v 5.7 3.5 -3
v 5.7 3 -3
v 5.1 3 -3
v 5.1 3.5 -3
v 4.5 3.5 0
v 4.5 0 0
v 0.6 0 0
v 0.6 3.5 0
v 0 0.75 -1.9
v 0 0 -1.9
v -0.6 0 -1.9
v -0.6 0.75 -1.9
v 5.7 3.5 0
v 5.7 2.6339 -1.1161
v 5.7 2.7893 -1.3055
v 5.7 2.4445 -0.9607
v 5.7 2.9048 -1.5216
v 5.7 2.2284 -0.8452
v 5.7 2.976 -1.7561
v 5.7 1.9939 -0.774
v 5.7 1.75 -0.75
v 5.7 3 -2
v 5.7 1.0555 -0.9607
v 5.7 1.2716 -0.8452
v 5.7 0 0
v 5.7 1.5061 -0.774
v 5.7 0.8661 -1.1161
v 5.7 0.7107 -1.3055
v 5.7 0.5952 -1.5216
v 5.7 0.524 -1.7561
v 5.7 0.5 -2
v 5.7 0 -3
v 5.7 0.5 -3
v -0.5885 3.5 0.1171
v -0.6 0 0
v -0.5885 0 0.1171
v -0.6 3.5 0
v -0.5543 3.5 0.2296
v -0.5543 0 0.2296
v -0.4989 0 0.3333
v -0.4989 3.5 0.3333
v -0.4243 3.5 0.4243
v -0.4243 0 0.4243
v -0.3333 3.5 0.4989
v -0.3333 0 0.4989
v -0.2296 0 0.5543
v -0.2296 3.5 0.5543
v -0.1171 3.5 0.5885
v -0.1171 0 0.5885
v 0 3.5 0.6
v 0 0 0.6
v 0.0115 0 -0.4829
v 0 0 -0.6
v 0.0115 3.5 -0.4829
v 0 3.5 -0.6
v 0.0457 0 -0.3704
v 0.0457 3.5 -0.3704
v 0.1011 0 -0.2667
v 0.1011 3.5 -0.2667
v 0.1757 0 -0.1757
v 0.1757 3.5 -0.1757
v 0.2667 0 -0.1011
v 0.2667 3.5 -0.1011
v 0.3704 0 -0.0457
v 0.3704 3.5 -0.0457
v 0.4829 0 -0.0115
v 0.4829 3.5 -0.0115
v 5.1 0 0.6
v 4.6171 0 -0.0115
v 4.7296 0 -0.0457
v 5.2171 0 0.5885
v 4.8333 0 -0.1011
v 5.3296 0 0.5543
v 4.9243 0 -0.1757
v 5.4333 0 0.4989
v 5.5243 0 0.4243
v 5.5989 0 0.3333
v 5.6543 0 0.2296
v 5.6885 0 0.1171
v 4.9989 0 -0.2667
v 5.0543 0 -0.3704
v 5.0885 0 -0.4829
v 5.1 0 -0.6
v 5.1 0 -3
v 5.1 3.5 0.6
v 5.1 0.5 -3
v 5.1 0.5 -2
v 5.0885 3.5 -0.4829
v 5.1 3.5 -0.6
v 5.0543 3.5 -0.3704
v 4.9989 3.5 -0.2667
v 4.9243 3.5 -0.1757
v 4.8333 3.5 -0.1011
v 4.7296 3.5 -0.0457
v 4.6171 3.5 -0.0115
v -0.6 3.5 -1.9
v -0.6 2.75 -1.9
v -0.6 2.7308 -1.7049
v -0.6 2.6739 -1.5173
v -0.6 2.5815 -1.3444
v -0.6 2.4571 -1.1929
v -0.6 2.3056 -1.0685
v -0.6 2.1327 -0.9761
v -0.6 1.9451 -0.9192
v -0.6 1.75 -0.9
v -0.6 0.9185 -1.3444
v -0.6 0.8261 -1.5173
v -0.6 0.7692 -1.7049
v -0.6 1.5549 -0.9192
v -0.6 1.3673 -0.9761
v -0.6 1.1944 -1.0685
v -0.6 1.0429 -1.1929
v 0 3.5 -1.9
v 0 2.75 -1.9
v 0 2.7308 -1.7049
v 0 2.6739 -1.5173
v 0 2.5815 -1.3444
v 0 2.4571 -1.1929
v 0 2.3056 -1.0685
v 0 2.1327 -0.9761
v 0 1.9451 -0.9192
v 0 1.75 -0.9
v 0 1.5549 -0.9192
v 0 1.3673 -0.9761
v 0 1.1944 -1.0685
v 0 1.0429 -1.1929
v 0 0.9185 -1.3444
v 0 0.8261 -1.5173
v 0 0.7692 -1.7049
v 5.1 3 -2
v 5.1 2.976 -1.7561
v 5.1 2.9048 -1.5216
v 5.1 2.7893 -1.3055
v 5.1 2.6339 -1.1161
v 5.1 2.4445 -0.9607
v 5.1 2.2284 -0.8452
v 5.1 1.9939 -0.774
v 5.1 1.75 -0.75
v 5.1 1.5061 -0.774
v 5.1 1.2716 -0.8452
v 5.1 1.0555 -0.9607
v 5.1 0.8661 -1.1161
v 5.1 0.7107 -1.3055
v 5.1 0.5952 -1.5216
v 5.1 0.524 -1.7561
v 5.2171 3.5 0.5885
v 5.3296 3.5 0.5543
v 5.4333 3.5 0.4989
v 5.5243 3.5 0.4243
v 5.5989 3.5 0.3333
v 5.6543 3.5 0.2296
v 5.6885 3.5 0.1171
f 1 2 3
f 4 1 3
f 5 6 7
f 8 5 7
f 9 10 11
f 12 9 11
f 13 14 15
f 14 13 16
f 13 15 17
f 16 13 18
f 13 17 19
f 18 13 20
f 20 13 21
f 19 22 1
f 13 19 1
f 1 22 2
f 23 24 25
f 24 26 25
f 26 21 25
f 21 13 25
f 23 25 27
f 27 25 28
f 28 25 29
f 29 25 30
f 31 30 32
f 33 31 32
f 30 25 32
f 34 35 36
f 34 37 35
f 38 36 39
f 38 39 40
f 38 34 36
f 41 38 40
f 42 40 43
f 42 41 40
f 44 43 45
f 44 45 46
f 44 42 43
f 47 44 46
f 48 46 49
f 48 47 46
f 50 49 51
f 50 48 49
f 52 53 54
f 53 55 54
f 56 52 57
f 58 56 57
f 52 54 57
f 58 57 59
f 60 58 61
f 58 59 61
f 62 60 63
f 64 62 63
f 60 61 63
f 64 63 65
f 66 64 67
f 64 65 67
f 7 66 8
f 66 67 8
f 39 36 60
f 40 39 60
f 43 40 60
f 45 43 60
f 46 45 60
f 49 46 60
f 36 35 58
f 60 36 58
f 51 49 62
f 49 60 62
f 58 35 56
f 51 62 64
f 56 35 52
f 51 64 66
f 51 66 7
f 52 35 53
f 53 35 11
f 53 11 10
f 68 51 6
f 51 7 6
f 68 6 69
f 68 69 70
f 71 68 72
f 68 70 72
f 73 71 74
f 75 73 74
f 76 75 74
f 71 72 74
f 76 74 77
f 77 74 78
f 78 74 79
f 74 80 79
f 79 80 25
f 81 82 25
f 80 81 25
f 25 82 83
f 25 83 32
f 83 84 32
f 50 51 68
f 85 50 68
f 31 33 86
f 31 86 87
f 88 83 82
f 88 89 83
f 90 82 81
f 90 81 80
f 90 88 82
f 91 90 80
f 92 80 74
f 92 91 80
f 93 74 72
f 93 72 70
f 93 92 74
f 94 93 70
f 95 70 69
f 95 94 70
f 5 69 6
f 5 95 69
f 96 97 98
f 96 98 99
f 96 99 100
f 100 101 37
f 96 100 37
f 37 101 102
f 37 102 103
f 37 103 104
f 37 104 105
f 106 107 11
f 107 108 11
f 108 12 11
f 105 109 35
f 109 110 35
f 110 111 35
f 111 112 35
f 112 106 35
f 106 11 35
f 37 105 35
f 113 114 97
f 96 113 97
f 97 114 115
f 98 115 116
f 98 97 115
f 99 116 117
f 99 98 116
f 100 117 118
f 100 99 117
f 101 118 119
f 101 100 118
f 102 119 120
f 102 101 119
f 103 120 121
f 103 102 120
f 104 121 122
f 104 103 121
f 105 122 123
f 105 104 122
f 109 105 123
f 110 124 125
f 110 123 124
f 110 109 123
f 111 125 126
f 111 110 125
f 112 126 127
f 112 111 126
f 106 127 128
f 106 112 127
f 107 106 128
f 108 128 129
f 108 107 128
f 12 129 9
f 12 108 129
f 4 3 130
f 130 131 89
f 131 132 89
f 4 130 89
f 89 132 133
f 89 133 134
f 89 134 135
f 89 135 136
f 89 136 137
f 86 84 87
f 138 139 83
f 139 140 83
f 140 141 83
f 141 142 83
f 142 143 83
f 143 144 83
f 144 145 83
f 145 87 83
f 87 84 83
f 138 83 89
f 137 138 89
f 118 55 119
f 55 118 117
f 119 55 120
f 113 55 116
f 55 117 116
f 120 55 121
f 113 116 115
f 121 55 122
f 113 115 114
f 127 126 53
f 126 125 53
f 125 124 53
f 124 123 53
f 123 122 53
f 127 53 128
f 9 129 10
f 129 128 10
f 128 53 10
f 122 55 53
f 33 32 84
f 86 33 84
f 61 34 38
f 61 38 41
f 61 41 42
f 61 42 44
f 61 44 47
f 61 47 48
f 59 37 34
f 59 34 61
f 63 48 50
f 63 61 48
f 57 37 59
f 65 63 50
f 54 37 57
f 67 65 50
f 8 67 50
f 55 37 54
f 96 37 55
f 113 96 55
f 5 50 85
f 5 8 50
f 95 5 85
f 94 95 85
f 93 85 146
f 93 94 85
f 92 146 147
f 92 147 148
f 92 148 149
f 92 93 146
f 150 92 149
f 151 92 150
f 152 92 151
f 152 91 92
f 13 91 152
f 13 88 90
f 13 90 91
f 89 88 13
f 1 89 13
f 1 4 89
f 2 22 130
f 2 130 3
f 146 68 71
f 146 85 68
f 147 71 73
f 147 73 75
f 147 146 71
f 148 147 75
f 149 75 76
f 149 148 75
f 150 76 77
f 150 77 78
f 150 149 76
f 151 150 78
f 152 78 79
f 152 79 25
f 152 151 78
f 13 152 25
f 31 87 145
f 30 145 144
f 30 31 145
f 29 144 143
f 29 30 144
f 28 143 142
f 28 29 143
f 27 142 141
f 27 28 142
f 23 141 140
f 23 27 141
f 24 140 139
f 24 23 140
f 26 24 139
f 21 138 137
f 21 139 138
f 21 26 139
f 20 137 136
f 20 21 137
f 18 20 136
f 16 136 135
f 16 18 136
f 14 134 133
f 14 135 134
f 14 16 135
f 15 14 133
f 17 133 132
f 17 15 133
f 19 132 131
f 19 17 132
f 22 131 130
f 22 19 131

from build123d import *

# Parameters (mm, degrees)
BOSS_EXTRUDE1_DEPTH = 3.5
FILLET1_R           = 0.6
CUT_EXTRUDE1_DEPTH  = 4
CUT_EXTRUDE2_DEPTH  = 10


with BuildPart() as part:
    # Sketch1 → Boss-Extrude1 (new body)
    with BuildSketch(Plane(origin=(0, 0, 0), x_dir=(1, 0, 0), z_dir=(0, 1, 0))):
        Polygon((0, 0), (0, 1.9), (-0.6, 1.9), (-0.6, -0.6), (5.7, -0.6), (5.7, 3), (5.1, 3), (5.1, 0), align=None)
    extrude(amount=BOSS_EXTRUDE1_DEPTH)

    # Fillet1
    fillet1_edges = [part.edges().sort_by_distance(p)[0] for p in [
        (5.1, 1.75, 0),
        (5.7, 1.75, 0.6),
        (-0.6, 1.75, 0.6),
        (0, 1.75, 0),
    ]]
    fillet(fillet1_edges, radius=FILLET1_R)

    # Sketch2 → Cut-Extrude1 (cut)
    with BuildSketch(Plane(origin=(5.7, 0, 0), x_dir=(0, 0, -1), z_dir=(1, 0, 0))):
        with BuildLine():
            Line((2, 3), (3, 3))
            Line((3, 3), (3, 0.5))
            Line((3, 0.5), (2, 0.5))
            ThreePointArc((2, 0.5), (0.75, 1.75), (2, 3))
        make_face()
    extrude(amount=-CUT_EXTRUDE1_DEPTH, mode=Mode.SUBTRACT)

    # Sketch3 → Cut-Extrude2 (cut)
    with BuildSketch(Plane.ZY.offset(0.6)):
        with BuildLine():
            Line((-1.9, 0.75), (-1.9, 2.75))
            ThreePointArc((-1.9, 2.75), (-0.9, 1.75), (-1.9, 0.75))
        make_face()
    extrude(amount=-CUT_EXTRUDE2_DEPTH, mode=Mode.SUBTRACT)


solid = part.part
